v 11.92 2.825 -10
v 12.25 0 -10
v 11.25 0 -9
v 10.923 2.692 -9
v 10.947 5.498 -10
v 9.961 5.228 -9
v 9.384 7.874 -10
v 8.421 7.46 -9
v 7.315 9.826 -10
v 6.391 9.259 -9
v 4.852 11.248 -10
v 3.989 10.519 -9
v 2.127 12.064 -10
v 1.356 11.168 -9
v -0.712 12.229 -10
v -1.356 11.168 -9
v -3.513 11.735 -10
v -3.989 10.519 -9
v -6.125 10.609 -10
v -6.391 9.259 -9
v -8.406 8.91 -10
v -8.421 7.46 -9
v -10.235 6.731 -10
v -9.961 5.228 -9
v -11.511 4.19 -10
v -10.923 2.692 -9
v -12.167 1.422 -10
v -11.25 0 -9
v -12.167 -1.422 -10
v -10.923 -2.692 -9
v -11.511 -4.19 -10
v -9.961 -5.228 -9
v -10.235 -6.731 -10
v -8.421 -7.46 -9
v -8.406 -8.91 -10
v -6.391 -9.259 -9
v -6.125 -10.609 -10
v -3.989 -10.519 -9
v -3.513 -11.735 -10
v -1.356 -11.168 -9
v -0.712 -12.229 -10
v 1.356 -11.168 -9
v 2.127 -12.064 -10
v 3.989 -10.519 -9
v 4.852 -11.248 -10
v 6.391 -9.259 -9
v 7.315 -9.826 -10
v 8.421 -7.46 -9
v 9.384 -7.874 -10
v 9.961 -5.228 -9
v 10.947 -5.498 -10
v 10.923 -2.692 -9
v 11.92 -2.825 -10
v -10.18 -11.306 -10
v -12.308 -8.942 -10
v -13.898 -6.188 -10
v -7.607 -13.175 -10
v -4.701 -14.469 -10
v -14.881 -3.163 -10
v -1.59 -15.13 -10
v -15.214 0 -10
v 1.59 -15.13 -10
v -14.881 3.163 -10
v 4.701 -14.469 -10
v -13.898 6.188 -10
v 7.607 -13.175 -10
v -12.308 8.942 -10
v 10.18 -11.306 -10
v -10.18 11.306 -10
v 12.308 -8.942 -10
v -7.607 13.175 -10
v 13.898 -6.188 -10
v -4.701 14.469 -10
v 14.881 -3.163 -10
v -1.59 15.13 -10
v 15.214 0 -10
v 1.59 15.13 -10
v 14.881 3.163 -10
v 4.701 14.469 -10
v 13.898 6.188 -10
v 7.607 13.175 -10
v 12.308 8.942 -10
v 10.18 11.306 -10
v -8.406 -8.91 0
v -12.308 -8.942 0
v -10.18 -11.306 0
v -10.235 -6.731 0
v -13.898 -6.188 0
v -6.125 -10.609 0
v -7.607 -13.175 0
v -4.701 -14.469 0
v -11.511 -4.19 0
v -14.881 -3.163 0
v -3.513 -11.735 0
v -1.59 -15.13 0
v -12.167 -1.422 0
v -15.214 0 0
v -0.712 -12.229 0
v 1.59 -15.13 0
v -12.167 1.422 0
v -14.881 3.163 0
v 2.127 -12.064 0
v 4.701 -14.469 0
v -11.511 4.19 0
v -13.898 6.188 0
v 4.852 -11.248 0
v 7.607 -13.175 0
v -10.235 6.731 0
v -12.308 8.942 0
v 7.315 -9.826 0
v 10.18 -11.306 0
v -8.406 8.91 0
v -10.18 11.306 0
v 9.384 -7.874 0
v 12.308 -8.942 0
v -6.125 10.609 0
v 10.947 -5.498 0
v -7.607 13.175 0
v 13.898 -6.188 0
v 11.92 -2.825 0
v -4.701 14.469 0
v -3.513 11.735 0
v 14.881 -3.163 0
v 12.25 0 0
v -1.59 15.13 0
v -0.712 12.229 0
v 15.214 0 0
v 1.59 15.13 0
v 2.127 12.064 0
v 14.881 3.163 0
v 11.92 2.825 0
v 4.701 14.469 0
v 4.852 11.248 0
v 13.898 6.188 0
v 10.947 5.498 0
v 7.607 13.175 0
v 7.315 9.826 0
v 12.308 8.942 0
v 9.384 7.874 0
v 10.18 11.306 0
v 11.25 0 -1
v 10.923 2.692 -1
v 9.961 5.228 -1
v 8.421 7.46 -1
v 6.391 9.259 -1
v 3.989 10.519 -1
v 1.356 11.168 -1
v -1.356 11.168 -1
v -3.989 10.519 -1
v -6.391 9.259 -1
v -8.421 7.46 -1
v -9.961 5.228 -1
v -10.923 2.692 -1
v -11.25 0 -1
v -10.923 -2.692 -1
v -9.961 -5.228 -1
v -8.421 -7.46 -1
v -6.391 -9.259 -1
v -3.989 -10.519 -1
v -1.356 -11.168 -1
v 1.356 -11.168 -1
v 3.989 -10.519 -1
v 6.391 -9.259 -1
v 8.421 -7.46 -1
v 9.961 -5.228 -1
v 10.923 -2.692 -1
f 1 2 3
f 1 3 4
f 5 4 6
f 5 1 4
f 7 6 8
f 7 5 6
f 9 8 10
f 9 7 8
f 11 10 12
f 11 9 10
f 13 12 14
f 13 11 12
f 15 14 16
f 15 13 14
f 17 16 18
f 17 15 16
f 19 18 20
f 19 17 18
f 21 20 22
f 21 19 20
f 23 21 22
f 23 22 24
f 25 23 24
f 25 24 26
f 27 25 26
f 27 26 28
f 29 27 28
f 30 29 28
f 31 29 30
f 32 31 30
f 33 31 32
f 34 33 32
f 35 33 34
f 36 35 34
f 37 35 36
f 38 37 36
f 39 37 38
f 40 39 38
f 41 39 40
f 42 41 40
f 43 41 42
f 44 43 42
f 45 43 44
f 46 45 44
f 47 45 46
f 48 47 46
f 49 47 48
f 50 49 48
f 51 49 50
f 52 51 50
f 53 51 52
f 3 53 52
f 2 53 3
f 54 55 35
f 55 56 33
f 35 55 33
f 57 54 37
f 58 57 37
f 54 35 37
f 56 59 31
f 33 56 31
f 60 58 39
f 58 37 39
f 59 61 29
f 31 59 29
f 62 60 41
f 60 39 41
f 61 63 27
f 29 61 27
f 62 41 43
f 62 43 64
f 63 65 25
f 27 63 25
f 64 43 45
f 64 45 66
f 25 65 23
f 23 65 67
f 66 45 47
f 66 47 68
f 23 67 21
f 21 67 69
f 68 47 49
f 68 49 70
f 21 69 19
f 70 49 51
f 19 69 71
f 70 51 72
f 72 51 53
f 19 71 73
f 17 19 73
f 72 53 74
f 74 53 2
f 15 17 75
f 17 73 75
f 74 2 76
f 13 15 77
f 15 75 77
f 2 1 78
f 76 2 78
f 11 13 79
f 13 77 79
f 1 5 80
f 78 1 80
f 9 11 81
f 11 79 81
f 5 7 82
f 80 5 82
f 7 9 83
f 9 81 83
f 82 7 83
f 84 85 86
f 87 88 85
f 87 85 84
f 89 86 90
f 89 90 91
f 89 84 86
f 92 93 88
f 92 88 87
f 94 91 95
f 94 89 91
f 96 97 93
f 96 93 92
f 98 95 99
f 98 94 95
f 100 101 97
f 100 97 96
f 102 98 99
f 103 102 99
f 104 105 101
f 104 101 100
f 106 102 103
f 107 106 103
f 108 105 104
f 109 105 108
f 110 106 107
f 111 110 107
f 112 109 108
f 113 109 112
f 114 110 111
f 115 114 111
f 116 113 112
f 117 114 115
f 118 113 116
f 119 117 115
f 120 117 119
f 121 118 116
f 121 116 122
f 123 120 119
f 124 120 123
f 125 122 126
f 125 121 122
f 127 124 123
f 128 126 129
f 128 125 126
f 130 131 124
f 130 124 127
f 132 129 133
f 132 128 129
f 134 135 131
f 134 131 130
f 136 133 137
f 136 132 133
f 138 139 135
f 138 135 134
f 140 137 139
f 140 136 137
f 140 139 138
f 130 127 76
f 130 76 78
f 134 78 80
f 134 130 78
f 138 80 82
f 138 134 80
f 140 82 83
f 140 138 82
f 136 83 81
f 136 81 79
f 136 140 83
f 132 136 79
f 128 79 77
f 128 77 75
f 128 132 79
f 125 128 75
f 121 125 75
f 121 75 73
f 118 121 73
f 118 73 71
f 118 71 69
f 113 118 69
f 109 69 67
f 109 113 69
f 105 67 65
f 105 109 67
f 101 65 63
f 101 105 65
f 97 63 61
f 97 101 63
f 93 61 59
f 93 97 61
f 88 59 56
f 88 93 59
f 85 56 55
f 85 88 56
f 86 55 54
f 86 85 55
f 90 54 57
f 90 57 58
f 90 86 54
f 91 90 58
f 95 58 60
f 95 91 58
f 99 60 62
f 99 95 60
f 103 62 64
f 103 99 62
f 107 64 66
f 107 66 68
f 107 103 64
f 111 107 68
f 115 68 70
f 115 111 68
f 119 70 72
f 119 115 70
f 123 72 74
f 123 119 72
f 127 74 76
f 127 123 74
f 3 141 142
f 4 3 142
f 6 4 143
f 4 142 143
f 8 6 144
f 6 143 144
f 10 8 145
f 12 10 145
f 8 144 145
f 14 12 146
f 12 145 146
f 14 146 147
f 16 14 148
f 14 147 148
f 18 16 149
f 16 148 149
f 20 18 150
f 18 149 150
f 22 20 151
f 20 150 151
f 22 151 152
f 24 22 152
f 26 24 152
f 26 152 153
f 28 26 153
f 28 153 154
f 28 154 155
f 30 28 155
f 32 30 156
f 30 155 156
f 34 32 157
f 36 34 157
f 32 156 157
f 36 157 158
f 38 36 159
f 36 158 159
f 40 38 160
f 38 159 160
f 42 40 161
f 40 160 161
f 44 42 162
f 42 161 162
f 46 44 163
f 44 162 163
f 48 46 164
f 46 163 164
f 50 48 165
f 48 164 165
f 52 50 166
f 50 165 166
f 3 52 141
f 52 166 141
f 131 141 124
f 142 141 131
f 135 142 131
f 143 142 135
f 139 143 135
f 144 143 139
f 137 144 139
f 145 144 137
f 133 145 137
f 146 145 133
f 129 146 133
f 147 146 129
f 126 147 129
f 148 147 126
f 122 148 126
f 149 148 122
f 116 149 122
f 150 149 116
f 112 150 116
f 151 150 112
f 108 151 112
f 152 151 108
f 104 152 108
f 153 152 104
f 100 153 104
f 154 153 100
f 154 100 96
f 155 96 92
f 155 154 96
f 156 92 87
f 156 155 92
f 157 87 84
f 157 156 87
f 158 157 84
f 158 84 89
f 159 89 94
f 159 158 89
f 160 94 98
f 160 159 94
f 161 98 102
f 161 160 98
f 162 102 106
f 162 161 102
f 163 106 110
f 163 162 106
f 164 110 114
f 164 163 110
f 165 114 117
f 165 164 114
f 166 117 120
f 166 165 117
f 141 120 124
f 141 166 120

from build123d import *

# Parameters (mm, degrees)
F0_R     = 11.75
F0_R_2   = 11.25
F1_DEPTH = 10
F2_R     = 15.213548
F2_R_2   = 11.75
F3_DEPTH = 10
F4_SIZE  = 1
F5_SIZE  = 1


with BuildPart() as f1:
    # F0 (on Top) → F1 (new body)
    with BuildSketch(Plane.XY):
        Circle(F0_R)
        Circle(F0_R_2, mode=Mode.SUBTRACT)
    extrude(amount=-F1_DEPTH)

    # F2 (on Top) → F3 (join)
    with BuildSketch(Plane.XY):
        Circle(F2_R)
        Circle(F2_R_2, mode=Mode.SUBTRACT)
    extrude(amount=-F3_DEPTH)

    # F4
    f4_edges = [f1.edges().sort_by_distance(p)[0] for p in [
        (-11.25, 0, 0),
    ]]
    chamfer(f4_edges, length=F4_SIZE)

    # F5
    f5_edges = [f1.edges().sort_by_distance(p)[0] for p in [
        (-11.25, 0, -10),
    ]]
    chamfer(f5_edges, length=F5_SIZE)


solid = f1.part
